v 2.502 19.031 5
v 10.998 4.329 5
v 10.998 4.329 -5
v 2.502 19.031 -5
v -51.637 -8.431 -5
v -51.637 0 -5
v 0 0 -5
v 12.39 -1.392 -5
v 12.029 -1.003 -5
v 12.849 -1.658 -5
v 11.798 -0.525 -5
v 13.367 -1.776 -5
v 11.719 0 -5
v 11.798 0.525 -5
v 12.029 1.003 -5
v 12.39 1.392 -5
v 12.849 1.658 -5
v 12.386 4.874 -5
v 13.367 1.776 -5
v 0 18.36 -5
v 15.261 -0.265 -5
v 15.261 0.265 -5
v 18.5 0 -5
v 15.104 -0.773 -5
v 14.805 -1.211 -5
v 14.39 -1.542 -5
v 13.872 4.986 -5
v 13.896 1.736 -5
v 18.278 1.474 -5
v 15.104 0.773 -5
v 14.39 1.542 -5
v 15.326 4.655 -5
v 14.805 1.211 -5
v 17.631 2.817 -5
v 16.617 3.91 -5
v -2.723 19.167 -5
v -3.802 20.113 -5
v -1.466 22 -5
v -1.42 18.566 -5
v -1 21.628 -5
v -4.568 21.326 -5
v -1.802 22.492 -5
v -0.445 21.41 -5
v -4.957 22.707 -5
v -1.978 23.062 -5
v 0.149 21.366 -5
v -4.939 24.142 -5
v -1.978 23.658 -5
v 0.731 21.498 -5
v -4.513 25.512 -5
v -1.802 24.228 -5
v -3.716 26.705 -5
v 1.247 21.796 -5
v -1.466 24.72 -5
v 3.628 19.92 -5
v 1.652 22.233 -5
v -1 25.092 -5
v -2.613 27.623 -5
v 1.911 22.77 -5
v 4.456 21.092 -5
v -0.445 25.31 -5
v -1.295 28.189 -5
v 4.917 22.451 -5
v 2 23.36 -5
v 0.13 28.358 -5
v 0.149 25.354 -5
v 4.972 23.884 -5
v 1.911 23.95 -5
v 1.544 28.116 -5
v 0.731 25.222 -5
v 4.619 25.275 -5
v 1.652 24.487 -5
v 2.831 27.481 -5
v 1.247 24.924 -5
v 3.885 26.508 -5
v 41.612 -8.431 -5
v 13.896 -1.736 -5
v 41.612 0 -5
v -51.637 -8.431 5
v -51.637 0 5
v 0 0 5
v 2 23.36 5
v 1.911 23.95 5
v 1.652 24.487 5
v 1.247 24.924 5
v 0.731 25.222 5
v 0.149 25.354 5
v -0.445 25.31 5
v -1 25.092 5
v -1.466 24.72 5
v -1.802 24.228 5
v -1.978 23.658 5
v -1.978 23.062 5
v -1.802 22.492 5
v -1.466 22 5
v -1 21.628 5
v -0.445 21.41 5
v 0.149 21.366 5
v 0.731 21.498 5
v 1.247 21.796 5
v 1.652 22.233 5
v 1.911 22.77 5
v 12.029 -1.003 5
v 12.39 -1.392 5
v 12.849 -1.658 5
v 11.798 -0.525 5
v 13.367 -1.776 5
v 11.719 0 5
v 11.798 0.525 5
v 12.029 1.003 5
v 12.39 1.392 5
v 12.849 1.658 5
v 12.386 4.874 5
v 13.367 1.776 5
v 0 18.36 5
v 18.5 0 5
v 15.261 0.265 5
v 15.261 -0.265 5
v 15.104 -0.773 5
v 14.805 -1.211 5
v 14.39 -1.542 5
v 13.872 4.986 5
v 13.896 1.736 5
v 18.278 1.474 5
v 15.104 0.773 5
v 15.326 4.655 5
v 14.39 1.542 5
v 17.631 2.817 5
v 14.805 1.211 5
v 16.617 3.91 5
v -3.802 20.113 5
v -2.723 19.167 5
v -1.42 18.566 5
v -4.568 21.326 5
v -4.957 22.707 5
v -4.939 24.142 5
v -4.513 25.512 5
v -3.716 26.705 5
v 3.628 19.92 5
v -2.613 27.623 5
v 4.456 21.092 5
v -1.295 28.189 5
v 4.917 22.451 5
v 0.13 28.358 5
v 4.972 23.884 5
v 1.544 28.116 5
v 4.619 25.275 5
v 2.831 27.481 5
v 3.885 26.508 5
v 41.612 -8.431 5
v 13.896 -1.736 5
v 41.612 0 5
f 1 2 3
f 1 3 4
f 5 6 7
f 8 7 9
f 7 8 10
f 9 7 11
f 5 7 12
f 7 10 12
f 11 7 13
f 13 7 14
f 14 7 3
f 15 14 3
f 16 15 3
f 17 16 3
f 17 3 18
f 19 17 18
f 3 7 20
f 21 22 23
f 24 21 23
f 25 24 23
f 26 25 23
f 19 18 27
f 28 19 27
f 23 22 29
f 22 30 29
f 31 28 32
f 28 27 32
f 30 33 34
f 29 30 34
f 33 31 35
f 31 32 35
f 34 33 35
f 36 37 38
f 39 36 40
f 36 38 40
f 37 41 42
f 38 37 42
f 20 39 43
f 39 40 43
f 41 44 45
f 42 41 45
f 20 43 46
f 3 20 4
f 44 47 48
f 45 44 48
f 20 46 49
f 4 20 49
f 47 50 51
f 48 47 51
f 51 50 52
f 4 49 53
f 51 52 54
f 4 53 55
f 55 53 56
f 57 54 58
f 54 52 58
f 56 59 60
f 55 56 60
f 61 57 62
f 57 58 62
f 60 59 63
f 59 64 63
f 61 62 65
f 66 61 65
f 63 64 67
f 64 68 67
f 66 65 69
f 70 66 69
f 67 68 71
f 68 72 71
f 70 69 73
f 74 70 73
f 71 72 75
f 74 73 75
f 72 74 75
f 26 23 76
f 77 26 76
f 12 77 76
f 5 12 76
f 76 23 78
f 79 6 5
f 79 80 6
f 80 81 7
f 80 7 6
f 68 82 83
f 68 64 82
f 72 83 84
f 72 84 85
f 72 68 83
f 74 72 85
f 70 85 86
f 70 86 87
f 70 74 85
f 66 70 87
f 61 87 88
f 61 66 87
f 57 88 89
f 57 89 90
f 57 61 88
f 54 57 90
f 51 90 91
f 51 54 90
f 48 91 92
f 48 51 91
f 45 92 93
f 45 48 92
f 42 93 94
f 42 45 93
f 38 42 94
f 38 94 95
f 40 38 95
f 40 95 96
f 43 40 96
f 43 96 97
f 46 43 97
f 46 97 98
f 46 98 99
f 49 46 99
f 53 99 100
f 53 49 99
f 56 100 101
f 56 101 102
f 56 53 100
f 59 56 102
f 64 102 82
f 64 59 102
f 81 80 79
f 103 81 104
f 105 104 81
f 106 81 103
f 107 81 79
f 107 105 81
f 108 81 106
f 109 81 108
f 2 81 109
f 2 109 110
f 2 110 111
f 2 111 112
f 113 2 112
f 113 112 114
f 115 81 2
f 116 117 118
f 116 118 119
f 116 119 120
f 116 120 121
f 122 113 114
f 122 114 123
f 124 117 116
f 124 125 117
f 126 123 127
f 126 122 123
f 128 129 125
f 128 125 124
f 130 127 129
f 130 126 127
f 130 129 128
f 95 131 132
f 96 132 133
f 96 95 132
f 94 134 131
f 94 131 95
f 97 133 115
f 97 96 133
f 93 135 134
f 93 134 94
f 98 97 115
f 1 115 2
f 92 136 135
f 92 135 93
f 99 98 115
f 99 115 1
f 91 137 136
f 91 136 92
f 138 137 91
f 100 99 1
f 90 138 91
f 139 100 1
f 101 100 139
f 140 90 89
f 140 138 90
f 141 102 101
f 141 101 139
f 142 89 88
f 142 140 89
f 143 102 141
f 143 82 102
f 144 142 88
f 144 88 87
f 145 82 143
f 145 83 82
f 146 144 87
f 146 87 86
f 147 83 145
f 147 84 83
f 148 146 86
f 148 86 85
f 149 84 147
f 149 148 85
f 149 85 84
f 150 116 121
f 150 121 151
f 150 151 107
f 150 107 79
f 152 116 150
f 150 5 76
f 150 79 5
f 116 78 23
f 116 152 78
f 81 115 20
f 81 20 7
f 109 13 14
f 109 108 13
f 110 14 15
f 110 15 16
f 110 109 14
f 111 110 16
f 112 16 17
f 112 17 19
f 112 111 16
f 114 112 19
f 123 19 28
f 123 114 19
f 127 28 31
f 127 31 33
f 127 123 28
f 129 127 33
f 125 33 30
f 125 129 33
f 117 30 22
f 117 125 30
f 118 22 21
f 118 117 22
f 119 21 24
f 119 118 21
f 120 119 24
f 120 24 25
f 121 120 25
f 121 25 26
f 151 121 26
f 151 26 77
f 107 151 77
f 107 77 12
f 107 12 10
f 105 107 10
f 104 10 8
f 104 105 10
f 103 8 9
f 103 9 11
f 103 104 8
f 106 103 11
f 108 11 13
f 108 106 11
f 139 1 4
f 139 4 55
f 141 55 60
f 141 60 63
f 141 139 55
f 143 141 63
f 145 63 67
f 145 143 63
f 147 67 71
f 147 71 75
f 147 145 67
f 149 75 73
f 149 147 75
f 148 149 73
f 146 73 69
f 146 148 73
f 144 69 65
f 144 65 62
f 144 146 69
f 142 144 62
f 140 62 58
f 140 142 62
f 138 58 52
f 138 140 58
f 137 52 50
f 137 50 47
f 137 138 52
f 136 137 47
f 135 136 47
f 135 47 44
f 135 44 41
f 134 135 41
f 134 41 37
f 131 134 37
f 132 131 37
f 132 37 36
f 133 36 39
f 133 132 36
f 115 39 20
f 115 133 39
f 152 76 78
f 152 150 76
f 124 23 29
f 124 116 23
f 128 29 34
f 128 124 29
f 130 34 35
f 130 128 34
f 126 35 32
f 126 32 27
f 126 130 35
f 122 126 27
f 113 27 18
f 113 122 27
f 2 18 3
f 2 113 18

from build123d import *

# Parameters (mm, degrees)
SKETCH_2_R      = 2
EXTRUDE_1_DEPTH = 5


with BuildPart() as part:
    # 草图2 → 凸台-拉伸1 (new, symmetric)
    with BuildSketch(Plane.XY):
        with BuildLine():
            ThreePointArc((18.5, 0), (15.999089719, 4.330652442), (10.99817977, 4.329075598))
            Line((10.99817977, 4.329075598), (2.50182023, 19.030924402))
            ThreePointArc((2.50182023, 19.030924402), (-1.295110422, 28.189356996), (0, 18.36))
            Line((0, 18.36), (0, 0))
            Line((0, 0), (-51.636977369, 0))
            Line((-51.636977369, 0), (-51.636977369, -8.430841873))
            Line((-51.636977369, -8.430841873), (41.612216194, -8.430841873))
            Line((41.612216194, -8.430841873), (41.612216194, 0))
            Line((41.612216194, 0), (18.5, 0))
        make_face()
        with BuildLine():
            ThreePointArc((15.280750547, 0), (13.5, -1.780750547), (11.719249453, 0))
            ThreePointArc((11.719249453, 0), (13.5, 1.780750547), (15.280750547, 0))
        make_face(mode=Mode.SUBTRACT)
        with Locations((0, 23.36)):
            Circle(SKETCH_2_R, mode=Mode.SUBTRACT)
    extrude(amount=EXTRUDE_1_DEPTH, both=True)


solid = part.part
